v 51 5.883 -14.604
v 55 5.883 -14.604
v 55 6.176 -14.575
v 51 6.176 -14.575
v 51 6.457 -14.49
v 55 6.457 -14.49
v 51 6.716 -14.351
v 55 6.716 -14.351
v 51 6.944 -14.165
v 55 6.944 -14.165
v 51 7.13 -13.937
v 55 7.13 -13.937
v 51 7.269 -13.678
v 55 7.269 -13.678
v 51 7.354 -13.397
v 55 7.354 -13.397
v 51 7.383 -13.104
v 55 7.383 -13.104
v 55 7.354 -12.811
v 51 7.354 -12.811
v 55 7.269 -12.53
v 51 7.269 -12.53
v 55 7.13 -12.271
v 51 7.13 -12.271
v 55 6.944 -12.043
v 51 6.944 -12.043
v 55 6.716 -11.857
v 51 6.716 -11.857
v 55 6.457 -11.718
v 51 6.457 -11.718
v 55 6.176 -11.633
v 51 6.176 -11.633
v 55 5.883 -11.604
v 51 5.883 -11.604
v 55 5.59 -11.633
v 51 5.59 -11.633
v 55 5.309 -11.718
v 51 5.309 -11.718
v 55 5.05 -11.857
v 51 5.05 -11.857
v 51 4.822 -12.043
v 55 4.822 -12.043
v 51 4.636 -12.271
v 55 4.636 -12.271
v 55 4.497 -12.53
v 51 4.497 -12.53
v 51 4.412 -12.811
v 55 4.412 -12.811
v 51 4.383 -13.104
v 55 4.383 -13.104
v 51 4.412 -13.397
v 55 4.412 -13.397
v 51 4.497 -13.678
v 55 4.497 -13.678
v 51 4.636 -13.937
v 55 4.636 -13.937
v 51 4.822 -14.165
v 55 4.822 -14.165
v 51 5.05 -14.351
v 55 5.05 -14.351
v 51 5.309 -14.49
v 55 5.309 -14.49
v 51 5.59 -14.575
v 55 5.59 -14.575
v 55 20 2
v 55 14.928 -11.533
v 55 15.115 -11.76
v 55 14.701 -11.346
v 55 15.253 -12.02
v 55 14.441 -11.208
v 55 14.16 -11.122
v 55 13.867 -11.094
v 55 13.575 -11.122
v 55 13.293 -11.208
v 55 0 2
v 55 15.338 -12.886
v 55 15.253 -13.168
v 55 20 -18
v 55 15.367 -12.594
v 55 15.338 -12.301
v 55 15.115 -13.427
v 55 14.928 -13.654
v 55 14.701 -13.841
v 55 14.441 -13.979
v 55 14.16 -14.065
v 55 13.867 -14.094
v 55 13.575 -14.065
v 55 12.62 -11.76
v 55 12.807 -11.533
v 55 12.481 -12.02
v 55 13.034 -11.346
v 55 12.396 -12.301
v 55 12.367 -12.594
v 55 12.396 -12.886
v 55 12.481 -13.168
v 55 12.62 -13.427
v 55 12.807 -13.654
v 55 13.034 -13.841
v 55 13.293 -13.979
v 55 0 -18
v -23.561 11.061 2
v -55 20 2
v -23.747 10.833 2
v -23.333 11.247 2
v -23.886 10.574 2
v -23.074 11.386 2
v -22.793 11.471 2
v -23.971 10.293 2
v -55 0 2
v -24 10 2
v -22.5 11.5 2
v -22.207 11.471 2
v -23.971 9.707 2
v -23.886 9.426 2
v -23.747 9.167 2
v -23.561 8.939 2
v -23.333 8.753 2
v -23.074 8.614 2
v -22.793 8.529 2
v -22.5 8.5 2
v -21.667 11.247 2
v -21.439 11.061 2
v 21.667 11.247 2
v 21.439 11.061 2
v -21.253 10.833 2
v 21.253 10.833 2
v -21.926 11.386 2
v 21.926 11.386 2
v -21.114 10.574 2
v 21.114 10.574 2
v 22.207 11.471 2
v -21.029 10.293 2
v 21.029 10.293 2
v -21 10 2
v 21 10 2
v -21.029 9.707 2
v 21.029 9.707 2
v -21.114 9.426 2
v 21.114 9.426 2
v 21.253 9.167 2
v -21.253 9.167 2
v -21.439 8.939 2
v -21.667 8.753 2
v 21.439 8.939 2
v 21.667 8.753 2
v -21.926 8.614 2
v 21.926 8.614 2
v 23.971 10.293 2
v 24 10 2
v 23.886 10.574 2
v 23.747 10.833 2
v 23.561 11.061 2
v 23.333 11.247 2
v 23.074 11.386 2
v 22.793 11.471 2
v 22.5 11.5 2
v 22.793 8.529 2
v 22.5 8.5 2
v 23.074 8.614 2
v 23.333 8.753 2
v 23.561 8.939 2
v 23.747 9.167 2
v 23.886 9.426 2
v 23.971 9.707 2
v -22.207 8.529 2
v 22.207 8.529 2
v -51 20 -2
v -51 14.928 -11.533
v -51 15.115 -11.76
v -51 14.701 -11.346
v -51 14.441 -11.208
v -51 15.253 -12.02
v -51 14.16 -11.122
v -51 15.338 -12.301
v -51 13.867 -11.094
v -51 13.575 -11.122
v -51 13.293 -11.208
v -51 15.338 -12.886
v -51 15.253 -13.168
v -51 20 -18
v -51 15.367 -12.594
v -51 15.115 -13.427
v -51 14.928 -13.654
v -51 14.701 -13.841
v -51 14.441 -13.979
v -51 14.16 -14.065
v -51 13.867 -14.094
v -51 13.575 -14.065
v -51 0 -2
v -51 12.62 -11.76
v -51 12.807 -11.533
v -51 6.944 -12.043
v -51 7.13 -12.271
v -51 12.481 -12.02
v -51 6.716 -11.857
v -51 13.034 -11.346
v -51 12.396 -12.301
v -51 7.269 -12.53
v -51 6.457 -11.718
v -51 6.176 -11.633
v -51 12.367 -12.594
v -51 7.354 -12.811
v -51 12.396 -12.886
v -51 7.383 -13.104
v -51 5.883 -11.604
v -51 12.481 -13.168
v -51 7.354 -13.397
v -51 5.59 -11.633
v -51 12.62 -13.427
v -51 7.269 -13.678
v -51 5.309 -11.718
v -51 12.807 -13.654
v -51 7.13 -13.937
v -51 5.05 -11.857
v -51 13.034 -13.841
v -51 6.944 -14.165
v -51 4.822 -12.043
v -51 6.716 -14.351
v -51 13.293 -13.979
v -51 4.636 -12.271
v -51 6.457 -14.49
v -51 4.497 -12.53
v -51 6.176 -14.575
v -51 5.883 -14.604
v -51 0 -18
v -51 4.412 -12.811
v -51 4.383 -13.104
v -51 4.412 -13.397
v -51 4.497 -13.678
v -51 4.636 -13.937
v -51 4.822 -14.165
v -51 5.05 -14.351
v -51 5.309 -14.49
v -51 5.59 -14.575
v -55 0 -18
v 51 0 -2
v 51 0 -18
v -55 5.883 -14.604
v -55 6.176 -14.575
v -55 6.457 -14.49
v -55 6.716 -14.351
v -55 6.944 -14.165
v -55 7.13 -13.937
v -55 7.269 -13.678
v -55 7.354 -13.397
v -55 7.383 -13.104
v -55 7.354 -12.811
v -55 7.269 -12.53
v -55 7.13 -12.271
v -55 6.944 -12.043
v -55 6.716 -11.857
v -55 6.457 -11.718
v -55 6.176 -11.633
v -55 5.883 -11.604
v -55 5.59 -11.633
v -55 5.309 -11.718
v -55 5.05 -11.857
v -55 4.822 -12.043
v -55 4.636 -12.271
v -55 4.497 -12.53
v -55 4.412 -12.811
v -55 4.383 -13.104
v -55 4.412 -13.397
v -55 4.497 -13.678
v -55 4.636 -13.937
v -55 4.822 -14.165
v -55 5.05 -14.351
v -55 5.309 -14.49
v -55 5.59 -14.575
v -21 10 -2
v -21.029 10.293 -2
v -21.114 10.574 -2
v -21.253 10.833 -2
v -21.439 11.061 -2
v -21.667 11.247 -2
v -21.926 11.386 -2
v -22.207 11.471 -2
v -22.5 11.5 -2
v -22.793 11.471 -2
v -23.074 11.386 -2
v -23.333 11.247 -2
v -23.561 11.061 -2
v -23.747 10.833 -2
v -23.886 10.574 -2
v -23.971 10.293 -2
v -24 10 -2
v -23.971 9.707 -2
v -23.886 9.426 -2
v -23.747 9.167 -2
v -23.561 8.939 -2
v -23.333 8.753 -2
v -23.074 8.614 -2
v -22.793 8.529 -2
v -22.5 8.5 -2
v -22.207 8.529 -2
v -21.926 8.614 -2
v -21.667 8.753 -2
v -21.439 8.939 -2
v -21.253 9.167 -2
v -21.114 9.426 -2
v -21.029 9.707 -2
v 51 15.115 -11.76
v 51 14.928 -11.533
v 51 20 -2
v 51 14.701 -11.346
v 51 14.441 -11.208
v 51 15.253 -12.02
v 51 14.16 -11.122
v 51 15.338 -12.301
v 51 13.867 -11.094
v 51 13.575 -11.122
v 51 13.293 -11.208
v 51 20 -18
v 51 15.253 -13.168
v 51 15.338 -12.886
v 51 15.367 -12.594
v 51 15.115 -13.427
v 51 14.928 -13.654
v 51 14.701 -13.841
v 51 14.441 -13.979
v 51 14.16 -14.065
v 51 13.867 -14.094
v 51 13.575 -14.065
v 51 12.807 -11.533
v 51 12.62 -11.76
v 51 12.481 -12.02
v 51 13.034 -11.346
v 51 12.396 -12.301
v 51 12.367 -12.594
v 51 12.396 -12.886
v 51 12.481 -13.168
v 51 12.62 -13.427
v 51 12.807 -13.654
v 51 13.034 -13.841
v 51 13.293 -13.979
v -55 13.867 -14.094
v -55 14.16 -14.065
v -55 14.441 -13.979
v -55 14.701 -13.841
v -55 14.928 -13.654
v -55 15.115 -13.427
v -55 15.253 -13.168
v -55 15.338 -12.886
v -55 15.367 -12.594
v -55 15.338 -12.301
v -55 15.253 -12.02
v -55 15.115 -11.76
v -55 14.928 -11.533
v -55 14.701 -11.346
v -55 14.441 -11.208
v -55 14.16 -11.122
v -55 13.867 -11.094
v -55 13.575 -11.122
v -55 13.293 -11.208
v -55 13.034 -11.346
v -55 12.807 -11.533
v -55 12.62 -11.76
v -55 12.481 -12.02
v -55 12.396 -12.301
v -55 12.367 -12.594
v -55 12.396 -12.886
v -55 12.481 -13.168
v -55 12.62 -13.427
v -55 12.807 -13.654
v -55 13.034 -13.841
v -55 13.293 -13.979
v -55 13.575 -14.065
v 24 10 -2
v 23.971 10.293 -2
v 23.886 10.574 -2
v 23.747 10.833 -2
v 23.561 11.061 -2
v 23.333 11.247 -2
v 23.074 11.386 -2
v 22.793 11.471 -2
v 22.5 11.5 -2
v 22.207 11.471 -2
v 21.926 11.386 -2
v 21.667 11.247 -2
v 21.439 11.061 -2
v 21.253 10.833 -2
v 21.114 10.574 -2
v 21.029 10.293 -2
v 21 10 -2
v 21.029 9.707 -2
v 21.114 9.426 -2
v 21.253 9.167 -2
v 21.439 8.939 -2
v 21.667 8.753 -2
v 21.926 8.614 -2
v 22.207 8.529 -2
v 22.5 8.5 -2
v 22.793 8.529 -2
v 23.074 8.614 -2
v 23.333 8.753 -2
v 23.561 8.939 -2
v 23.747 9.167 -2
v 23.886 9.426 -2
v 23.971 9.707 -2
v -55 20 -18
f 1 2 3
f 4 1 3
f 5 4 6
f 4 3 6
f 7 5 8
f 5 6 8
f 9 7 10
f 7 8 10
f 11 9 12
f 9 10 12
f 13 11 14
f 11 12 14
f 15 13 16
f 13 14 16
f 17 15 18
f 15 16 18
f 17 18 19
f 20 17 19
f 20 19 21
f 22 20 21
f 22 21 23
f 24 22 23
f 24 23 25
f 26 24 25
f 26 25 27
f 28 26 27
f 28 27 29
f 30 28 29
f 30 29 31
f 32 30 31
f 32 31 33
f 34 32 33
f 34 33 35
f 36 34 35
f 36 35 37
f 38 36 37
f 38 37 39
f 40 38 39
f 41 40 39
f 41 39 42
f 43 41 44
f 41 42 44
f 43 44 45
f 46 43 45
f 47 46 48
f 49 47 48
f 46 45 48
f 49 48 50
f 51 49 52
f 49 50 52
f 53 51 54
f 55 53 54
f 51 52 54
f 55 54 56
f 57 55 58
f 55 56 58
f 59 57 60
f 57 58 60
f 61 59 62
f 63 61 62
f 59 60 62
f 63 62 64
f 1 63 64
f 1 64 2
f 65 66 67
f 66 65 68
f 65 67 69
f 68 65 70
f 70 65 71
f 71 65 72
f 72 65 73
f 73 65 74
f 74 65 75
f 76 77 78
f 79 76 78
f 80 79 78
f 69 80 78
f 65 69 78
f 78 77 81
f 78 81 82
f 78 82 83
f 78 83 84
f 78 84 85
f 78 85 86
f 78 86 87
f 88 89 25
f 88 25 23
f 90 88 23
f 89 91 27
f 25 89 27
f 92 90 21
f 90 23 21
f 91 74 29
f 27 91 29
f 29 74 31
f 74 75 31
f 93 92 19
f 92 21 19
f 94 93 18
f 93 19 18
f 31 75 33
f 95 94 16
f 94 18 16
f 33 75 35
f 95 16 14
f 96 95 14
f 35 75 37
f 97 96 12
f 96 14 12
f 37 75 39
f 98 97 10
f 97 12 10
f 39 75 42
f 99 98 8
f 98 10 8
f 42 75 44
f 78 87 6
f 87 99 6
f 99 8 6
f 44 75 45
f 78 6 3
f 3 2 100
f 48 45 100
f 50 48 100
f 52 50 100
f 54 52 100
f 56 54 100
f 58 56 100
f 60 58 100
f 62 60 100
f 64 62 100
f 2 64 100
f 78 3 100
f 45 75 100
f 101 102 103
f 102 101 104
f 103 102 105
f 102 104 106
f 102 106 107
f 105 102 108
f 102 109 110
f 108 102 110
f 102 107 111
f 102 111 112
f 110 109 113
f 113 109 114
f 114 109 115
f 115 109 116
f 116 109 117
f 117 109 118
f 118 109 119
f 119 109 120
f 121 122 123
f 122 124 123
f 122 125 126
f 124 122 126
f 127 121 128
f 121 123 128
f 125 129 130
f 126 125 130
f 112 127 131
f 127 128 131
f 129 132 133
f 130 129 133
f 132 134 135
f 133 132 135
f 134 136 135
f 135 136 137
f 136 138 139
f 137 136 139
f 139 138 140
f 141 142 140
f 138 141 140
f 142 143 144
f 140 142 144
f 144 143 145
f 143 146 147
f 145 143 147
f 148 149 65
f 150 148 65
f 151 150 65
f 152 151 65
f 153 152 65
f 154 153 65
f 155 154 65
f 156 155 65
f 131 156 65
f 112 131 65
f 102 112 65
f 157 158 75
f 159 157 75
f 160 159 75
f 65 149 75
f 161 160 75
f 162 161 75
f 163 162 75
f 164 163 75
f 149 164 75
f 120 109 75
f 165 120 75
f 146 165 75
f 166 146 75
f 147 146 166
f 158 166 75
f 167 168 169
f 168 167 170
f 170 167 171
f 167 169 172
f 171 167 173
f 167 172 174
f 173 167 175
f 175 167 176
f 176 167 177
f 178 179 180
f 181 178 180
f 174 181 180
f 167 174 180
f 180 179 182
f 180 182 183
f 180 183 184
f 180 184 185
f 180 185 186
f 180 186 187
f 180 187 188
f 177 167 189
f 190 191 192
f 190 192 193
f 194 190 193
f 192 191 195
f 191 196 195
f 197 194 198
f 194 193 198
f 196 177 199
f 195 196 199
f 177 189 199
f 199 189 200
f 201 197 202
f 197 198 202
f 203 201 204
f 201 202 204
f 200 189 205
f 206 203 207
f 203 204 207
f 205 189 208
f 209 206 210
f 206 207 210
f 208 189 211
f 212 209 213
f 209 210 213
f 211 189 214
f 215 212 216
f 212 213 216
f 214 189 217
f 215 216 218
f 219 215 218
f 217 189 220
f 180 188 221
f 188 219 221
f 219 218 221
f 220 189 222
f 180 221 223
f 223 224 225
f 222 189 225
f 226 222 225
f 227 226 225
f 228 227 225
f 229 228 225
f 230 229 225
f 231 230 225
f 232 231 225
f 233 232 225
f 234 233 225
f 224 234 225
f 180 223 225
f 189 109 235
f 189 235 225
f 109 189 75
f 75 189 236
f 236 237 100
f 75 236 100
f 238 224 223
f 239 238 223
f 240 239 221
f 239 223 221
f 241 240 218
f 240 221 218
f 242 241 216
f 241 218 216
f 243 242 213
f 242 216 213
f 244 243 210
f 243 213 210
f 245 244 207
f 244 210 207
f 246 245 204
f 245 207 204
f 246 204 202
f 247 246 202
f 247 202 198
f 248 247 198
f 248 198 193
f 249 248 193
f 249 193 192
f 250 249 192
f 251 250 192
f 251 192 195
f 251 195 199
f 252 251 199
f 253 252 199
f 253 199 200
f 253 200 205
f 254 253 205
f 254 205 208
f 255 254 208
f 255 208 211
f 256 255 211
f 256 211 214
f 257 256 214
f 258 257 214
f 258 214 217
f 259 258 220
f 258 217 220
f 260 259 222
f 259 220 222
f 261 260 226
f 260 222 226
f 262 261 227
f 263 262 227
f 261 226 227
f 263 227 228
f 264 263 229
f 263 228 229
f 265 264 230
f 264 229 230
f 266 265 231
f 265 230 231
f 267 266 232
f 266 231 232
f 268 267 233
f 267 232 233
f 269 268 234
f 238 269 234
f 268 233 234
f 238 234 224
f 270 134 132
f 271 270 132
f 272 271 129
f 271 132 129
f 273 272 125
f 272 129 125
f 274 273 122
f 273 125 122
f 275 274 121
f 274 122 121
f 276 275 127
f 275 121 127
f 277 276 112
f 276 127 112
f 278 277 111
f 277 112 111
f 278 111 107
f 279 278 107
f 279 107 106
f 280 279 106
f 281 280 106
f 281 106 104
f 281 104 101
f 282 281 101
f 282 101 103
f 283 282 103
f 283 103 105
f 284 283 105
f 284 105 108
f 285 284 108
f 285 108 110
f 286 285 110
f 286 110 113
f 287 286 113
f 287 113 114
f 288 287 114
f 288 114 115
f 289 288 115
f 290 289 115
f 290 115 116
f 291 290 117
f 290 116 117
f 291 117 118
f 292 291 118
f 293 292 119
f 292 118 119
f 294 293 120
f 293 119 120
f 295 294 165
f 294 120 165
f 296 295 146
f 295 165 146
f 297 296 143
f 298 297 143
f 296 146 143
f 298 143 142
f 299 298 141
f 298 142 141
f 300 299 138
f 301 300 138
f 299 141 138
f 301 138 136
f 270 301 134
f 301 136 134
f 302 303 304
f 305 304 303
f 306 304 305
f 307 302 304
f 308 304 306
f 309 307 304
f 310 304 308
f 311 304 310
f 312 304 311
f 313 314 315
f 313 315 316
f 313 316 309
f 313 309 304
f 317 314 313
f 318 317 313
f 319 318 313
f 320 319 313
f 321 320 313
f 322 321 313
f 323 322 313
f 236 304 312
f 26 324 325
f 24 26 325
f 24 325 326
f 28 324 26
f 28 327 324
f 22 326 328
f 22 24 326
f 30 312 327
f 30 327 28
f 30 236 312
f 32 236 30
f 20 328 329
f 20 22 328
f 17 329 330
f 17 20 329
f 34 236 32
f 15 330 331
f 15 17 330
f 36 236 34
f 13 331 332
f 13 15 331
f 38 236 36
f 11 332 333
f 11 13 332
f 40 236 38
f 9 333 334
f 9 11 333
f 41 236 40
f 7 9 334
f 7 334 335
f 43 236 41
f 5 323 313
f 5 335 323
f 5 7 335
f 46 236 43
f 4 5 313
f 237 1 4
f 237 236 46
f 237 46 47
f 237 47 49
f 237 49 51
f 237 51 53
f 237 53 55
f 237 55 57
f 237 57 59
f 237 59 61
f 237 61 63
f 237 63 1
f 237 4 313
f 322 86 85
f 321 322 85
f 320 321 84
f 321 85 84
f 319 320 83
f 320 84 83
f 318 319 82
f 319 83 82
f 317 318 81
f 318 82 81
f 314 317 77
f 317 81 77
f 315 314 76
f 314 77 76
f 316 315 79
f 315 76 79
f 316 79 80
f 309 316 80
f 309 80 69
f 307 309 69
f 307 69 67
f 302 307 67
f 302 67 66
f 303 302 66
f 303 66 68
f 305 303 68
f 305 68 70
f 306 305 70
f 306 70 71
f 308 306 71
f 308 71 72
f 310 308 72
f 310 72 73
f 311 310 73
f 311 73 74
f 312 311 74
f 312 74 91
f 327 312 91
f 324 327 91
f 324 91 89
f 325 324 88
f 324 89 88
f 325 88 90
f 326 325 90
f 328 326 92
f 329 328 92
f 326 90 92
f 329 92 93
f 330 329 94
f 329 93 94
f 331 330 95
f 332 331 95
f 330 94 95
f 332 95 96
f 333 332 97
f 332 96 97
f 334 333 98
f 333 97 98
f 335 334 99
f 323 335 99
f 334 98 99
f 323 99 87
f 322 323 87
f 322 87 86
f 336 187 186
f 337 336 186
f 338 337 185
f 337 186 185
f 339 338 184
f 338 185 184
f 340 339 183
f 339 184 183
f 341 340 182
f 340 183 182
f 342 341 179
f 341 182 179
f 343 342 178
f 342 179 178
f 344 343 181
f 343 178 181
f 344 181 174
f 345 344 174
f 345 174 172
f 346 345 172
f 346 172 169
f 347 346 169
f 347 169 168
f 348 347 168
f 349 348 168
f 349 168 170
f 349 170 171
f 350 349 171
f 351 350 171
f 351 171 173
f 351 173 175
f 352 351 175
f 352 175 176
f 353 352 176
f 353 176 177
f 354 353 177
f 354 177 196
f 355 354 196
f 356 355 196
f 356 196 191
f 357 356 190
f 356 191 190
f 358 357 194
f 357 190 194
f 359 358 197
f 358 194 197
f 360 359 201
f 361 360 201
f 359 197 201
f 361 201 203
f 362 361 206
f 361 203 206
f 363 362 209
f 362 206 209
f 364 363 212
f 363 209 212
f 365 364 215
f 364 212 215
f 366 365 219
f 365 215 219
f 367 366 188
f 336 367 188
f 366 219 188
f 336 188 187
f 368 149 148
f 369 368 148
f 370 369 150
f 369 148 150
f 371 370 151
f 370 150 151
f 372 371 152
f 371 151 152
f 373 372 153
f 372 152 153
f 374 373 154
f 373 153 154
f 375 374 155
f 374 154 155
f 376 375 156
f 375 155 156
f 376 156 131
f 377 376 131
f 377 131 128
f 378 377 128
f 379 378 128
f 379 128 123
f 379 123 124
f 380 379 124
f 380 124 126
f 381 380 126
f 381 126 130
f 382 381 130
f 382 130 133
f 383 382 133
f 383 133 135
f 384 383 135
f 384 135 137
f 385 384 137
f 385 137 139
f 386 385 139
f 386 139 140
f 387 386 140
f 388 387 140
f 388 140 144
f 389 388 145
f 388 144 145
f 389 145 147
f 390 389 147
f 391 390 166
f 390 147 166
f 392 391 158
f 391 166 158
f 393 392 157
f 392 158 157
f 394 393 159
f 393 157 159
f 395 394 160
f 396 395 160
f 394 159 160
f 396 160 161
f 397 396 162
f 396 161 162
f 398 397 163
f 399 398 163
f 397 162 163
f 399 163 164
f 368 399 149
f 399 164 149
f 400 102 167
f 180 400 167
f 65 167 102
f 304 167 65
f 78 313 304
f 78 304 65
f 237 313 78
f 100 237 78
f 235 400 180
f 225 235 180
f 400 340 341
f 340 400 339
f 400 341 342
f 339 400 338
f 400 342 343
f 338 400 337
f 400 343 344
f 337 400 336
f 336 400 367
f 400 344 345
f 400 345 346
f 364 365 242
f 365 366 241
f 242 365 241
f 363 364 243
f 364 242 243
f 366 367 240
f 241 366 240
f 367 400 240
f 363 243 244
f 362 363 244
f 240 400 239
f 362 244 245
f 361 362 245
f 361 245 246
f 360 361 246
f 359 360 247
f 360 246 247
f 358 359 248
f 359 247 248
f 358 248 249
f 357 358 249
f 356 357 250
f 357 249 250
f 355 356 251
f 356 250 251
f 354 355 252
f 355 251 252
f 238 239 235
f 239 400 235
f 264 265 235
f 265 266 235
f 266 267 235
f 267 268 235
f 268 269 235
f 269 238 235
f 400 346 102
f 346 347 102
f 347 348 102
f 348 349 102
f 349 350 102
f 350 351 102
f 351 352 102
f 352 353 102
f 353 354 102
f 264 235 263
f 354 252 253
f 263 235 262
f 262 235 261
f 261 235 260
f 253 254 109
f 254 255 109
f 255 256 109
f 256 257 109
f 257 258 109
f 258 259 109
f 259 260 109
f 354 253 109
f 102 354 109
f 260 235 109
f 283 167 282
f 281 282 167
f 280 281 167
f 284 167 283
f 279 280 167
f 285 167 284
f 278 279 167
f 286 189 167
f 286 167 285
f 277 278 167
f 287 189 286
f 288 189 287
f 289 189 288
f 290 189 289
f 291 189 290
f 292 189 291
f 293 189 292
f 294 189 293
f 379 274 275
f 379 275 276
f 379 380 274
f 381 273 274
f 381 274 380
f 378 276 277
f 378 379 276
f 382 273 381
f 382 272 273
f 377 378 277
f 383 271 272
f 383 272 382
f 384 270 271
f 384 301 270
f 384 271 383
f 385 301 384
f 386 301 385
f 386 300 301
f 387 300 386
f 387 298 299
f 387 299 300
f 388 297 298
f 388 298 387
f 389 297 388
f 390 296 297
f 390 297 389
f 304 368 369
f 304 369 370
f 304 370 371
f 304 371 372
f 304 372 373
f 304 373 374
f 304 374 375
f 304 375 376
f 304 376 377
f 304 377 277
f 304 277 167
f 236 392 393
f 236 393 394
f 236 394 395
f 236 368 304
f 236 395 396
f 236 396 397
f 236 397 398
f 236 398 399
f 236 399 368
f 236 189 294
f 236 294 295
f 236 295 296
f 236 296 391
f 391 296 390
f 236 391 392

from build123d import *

# Parameters (mm, degrees)
SKETCH1_W           = 110
SKETCH1_H           = 4
SKETCH1_W_2         = 4
SKETCH1_H_2         = 16
BOSS_EXTRUDE1_DEPTH = 20
SKETCH2_R           = 1.5
CUT_EXTRUDE1_DEPTH  = 114.243101335
SKETCH3_R           = 1.5
CUT_EXTRUDE2_DEPTH  = 62.846584384


with BuildPart() as part:
    # Sketch1 → Boss-Extrude1 (new body)
    with BuildSketch(Plane(origin=(0, 0, 0), x_dir=(1, 0, 0), z_dir=(0, 1, 0))):
        Rectangle(SKETCH1_W, SKETCH1_H)
        with Locations((-53, 10)):
            Rectangle(SKETCH1_W_2, SKETCH1_H_2)
        with Locations((53, 10)):
            Rectangle(SKETCH1_W_2, SKETCH1_H_2)
    extrude(amount=BOSS_EXTRUDE1_DEPTH)

    # Sketch2 → Cut-Extrude1 (cut, through all)
    with BuildSketch(Plane(origin=(55, 0, 0), x_dir=(0, 0, -1), z_dir=(1, 0, 0))):
        with Locations((12.593610515, 13.86730529)):
            Circle(SKETCH2_R)
        with Locations((13.103987848, 5.882981905)):
            Circle(SKETCH2_R)
    extrude(amount=-CUT_EXTRUDE1_DEPTH, mode=Mode.SUBTRACT)

    # Sketch3 → Cut-Extrude2 (cut, through all)
    with BuildSketch(Plane.XY.offset(2)):
        with Locations((22.5, 10)):
            Circle(SKETCH3_R)
        with Locations((-22.5, 10)):
            Circle(SKETCH3_R)
    extrude(amount=-CUT_EXTRUDE2_DEPTH, mode=Mode.SUBTRACT)


solid = part.part
